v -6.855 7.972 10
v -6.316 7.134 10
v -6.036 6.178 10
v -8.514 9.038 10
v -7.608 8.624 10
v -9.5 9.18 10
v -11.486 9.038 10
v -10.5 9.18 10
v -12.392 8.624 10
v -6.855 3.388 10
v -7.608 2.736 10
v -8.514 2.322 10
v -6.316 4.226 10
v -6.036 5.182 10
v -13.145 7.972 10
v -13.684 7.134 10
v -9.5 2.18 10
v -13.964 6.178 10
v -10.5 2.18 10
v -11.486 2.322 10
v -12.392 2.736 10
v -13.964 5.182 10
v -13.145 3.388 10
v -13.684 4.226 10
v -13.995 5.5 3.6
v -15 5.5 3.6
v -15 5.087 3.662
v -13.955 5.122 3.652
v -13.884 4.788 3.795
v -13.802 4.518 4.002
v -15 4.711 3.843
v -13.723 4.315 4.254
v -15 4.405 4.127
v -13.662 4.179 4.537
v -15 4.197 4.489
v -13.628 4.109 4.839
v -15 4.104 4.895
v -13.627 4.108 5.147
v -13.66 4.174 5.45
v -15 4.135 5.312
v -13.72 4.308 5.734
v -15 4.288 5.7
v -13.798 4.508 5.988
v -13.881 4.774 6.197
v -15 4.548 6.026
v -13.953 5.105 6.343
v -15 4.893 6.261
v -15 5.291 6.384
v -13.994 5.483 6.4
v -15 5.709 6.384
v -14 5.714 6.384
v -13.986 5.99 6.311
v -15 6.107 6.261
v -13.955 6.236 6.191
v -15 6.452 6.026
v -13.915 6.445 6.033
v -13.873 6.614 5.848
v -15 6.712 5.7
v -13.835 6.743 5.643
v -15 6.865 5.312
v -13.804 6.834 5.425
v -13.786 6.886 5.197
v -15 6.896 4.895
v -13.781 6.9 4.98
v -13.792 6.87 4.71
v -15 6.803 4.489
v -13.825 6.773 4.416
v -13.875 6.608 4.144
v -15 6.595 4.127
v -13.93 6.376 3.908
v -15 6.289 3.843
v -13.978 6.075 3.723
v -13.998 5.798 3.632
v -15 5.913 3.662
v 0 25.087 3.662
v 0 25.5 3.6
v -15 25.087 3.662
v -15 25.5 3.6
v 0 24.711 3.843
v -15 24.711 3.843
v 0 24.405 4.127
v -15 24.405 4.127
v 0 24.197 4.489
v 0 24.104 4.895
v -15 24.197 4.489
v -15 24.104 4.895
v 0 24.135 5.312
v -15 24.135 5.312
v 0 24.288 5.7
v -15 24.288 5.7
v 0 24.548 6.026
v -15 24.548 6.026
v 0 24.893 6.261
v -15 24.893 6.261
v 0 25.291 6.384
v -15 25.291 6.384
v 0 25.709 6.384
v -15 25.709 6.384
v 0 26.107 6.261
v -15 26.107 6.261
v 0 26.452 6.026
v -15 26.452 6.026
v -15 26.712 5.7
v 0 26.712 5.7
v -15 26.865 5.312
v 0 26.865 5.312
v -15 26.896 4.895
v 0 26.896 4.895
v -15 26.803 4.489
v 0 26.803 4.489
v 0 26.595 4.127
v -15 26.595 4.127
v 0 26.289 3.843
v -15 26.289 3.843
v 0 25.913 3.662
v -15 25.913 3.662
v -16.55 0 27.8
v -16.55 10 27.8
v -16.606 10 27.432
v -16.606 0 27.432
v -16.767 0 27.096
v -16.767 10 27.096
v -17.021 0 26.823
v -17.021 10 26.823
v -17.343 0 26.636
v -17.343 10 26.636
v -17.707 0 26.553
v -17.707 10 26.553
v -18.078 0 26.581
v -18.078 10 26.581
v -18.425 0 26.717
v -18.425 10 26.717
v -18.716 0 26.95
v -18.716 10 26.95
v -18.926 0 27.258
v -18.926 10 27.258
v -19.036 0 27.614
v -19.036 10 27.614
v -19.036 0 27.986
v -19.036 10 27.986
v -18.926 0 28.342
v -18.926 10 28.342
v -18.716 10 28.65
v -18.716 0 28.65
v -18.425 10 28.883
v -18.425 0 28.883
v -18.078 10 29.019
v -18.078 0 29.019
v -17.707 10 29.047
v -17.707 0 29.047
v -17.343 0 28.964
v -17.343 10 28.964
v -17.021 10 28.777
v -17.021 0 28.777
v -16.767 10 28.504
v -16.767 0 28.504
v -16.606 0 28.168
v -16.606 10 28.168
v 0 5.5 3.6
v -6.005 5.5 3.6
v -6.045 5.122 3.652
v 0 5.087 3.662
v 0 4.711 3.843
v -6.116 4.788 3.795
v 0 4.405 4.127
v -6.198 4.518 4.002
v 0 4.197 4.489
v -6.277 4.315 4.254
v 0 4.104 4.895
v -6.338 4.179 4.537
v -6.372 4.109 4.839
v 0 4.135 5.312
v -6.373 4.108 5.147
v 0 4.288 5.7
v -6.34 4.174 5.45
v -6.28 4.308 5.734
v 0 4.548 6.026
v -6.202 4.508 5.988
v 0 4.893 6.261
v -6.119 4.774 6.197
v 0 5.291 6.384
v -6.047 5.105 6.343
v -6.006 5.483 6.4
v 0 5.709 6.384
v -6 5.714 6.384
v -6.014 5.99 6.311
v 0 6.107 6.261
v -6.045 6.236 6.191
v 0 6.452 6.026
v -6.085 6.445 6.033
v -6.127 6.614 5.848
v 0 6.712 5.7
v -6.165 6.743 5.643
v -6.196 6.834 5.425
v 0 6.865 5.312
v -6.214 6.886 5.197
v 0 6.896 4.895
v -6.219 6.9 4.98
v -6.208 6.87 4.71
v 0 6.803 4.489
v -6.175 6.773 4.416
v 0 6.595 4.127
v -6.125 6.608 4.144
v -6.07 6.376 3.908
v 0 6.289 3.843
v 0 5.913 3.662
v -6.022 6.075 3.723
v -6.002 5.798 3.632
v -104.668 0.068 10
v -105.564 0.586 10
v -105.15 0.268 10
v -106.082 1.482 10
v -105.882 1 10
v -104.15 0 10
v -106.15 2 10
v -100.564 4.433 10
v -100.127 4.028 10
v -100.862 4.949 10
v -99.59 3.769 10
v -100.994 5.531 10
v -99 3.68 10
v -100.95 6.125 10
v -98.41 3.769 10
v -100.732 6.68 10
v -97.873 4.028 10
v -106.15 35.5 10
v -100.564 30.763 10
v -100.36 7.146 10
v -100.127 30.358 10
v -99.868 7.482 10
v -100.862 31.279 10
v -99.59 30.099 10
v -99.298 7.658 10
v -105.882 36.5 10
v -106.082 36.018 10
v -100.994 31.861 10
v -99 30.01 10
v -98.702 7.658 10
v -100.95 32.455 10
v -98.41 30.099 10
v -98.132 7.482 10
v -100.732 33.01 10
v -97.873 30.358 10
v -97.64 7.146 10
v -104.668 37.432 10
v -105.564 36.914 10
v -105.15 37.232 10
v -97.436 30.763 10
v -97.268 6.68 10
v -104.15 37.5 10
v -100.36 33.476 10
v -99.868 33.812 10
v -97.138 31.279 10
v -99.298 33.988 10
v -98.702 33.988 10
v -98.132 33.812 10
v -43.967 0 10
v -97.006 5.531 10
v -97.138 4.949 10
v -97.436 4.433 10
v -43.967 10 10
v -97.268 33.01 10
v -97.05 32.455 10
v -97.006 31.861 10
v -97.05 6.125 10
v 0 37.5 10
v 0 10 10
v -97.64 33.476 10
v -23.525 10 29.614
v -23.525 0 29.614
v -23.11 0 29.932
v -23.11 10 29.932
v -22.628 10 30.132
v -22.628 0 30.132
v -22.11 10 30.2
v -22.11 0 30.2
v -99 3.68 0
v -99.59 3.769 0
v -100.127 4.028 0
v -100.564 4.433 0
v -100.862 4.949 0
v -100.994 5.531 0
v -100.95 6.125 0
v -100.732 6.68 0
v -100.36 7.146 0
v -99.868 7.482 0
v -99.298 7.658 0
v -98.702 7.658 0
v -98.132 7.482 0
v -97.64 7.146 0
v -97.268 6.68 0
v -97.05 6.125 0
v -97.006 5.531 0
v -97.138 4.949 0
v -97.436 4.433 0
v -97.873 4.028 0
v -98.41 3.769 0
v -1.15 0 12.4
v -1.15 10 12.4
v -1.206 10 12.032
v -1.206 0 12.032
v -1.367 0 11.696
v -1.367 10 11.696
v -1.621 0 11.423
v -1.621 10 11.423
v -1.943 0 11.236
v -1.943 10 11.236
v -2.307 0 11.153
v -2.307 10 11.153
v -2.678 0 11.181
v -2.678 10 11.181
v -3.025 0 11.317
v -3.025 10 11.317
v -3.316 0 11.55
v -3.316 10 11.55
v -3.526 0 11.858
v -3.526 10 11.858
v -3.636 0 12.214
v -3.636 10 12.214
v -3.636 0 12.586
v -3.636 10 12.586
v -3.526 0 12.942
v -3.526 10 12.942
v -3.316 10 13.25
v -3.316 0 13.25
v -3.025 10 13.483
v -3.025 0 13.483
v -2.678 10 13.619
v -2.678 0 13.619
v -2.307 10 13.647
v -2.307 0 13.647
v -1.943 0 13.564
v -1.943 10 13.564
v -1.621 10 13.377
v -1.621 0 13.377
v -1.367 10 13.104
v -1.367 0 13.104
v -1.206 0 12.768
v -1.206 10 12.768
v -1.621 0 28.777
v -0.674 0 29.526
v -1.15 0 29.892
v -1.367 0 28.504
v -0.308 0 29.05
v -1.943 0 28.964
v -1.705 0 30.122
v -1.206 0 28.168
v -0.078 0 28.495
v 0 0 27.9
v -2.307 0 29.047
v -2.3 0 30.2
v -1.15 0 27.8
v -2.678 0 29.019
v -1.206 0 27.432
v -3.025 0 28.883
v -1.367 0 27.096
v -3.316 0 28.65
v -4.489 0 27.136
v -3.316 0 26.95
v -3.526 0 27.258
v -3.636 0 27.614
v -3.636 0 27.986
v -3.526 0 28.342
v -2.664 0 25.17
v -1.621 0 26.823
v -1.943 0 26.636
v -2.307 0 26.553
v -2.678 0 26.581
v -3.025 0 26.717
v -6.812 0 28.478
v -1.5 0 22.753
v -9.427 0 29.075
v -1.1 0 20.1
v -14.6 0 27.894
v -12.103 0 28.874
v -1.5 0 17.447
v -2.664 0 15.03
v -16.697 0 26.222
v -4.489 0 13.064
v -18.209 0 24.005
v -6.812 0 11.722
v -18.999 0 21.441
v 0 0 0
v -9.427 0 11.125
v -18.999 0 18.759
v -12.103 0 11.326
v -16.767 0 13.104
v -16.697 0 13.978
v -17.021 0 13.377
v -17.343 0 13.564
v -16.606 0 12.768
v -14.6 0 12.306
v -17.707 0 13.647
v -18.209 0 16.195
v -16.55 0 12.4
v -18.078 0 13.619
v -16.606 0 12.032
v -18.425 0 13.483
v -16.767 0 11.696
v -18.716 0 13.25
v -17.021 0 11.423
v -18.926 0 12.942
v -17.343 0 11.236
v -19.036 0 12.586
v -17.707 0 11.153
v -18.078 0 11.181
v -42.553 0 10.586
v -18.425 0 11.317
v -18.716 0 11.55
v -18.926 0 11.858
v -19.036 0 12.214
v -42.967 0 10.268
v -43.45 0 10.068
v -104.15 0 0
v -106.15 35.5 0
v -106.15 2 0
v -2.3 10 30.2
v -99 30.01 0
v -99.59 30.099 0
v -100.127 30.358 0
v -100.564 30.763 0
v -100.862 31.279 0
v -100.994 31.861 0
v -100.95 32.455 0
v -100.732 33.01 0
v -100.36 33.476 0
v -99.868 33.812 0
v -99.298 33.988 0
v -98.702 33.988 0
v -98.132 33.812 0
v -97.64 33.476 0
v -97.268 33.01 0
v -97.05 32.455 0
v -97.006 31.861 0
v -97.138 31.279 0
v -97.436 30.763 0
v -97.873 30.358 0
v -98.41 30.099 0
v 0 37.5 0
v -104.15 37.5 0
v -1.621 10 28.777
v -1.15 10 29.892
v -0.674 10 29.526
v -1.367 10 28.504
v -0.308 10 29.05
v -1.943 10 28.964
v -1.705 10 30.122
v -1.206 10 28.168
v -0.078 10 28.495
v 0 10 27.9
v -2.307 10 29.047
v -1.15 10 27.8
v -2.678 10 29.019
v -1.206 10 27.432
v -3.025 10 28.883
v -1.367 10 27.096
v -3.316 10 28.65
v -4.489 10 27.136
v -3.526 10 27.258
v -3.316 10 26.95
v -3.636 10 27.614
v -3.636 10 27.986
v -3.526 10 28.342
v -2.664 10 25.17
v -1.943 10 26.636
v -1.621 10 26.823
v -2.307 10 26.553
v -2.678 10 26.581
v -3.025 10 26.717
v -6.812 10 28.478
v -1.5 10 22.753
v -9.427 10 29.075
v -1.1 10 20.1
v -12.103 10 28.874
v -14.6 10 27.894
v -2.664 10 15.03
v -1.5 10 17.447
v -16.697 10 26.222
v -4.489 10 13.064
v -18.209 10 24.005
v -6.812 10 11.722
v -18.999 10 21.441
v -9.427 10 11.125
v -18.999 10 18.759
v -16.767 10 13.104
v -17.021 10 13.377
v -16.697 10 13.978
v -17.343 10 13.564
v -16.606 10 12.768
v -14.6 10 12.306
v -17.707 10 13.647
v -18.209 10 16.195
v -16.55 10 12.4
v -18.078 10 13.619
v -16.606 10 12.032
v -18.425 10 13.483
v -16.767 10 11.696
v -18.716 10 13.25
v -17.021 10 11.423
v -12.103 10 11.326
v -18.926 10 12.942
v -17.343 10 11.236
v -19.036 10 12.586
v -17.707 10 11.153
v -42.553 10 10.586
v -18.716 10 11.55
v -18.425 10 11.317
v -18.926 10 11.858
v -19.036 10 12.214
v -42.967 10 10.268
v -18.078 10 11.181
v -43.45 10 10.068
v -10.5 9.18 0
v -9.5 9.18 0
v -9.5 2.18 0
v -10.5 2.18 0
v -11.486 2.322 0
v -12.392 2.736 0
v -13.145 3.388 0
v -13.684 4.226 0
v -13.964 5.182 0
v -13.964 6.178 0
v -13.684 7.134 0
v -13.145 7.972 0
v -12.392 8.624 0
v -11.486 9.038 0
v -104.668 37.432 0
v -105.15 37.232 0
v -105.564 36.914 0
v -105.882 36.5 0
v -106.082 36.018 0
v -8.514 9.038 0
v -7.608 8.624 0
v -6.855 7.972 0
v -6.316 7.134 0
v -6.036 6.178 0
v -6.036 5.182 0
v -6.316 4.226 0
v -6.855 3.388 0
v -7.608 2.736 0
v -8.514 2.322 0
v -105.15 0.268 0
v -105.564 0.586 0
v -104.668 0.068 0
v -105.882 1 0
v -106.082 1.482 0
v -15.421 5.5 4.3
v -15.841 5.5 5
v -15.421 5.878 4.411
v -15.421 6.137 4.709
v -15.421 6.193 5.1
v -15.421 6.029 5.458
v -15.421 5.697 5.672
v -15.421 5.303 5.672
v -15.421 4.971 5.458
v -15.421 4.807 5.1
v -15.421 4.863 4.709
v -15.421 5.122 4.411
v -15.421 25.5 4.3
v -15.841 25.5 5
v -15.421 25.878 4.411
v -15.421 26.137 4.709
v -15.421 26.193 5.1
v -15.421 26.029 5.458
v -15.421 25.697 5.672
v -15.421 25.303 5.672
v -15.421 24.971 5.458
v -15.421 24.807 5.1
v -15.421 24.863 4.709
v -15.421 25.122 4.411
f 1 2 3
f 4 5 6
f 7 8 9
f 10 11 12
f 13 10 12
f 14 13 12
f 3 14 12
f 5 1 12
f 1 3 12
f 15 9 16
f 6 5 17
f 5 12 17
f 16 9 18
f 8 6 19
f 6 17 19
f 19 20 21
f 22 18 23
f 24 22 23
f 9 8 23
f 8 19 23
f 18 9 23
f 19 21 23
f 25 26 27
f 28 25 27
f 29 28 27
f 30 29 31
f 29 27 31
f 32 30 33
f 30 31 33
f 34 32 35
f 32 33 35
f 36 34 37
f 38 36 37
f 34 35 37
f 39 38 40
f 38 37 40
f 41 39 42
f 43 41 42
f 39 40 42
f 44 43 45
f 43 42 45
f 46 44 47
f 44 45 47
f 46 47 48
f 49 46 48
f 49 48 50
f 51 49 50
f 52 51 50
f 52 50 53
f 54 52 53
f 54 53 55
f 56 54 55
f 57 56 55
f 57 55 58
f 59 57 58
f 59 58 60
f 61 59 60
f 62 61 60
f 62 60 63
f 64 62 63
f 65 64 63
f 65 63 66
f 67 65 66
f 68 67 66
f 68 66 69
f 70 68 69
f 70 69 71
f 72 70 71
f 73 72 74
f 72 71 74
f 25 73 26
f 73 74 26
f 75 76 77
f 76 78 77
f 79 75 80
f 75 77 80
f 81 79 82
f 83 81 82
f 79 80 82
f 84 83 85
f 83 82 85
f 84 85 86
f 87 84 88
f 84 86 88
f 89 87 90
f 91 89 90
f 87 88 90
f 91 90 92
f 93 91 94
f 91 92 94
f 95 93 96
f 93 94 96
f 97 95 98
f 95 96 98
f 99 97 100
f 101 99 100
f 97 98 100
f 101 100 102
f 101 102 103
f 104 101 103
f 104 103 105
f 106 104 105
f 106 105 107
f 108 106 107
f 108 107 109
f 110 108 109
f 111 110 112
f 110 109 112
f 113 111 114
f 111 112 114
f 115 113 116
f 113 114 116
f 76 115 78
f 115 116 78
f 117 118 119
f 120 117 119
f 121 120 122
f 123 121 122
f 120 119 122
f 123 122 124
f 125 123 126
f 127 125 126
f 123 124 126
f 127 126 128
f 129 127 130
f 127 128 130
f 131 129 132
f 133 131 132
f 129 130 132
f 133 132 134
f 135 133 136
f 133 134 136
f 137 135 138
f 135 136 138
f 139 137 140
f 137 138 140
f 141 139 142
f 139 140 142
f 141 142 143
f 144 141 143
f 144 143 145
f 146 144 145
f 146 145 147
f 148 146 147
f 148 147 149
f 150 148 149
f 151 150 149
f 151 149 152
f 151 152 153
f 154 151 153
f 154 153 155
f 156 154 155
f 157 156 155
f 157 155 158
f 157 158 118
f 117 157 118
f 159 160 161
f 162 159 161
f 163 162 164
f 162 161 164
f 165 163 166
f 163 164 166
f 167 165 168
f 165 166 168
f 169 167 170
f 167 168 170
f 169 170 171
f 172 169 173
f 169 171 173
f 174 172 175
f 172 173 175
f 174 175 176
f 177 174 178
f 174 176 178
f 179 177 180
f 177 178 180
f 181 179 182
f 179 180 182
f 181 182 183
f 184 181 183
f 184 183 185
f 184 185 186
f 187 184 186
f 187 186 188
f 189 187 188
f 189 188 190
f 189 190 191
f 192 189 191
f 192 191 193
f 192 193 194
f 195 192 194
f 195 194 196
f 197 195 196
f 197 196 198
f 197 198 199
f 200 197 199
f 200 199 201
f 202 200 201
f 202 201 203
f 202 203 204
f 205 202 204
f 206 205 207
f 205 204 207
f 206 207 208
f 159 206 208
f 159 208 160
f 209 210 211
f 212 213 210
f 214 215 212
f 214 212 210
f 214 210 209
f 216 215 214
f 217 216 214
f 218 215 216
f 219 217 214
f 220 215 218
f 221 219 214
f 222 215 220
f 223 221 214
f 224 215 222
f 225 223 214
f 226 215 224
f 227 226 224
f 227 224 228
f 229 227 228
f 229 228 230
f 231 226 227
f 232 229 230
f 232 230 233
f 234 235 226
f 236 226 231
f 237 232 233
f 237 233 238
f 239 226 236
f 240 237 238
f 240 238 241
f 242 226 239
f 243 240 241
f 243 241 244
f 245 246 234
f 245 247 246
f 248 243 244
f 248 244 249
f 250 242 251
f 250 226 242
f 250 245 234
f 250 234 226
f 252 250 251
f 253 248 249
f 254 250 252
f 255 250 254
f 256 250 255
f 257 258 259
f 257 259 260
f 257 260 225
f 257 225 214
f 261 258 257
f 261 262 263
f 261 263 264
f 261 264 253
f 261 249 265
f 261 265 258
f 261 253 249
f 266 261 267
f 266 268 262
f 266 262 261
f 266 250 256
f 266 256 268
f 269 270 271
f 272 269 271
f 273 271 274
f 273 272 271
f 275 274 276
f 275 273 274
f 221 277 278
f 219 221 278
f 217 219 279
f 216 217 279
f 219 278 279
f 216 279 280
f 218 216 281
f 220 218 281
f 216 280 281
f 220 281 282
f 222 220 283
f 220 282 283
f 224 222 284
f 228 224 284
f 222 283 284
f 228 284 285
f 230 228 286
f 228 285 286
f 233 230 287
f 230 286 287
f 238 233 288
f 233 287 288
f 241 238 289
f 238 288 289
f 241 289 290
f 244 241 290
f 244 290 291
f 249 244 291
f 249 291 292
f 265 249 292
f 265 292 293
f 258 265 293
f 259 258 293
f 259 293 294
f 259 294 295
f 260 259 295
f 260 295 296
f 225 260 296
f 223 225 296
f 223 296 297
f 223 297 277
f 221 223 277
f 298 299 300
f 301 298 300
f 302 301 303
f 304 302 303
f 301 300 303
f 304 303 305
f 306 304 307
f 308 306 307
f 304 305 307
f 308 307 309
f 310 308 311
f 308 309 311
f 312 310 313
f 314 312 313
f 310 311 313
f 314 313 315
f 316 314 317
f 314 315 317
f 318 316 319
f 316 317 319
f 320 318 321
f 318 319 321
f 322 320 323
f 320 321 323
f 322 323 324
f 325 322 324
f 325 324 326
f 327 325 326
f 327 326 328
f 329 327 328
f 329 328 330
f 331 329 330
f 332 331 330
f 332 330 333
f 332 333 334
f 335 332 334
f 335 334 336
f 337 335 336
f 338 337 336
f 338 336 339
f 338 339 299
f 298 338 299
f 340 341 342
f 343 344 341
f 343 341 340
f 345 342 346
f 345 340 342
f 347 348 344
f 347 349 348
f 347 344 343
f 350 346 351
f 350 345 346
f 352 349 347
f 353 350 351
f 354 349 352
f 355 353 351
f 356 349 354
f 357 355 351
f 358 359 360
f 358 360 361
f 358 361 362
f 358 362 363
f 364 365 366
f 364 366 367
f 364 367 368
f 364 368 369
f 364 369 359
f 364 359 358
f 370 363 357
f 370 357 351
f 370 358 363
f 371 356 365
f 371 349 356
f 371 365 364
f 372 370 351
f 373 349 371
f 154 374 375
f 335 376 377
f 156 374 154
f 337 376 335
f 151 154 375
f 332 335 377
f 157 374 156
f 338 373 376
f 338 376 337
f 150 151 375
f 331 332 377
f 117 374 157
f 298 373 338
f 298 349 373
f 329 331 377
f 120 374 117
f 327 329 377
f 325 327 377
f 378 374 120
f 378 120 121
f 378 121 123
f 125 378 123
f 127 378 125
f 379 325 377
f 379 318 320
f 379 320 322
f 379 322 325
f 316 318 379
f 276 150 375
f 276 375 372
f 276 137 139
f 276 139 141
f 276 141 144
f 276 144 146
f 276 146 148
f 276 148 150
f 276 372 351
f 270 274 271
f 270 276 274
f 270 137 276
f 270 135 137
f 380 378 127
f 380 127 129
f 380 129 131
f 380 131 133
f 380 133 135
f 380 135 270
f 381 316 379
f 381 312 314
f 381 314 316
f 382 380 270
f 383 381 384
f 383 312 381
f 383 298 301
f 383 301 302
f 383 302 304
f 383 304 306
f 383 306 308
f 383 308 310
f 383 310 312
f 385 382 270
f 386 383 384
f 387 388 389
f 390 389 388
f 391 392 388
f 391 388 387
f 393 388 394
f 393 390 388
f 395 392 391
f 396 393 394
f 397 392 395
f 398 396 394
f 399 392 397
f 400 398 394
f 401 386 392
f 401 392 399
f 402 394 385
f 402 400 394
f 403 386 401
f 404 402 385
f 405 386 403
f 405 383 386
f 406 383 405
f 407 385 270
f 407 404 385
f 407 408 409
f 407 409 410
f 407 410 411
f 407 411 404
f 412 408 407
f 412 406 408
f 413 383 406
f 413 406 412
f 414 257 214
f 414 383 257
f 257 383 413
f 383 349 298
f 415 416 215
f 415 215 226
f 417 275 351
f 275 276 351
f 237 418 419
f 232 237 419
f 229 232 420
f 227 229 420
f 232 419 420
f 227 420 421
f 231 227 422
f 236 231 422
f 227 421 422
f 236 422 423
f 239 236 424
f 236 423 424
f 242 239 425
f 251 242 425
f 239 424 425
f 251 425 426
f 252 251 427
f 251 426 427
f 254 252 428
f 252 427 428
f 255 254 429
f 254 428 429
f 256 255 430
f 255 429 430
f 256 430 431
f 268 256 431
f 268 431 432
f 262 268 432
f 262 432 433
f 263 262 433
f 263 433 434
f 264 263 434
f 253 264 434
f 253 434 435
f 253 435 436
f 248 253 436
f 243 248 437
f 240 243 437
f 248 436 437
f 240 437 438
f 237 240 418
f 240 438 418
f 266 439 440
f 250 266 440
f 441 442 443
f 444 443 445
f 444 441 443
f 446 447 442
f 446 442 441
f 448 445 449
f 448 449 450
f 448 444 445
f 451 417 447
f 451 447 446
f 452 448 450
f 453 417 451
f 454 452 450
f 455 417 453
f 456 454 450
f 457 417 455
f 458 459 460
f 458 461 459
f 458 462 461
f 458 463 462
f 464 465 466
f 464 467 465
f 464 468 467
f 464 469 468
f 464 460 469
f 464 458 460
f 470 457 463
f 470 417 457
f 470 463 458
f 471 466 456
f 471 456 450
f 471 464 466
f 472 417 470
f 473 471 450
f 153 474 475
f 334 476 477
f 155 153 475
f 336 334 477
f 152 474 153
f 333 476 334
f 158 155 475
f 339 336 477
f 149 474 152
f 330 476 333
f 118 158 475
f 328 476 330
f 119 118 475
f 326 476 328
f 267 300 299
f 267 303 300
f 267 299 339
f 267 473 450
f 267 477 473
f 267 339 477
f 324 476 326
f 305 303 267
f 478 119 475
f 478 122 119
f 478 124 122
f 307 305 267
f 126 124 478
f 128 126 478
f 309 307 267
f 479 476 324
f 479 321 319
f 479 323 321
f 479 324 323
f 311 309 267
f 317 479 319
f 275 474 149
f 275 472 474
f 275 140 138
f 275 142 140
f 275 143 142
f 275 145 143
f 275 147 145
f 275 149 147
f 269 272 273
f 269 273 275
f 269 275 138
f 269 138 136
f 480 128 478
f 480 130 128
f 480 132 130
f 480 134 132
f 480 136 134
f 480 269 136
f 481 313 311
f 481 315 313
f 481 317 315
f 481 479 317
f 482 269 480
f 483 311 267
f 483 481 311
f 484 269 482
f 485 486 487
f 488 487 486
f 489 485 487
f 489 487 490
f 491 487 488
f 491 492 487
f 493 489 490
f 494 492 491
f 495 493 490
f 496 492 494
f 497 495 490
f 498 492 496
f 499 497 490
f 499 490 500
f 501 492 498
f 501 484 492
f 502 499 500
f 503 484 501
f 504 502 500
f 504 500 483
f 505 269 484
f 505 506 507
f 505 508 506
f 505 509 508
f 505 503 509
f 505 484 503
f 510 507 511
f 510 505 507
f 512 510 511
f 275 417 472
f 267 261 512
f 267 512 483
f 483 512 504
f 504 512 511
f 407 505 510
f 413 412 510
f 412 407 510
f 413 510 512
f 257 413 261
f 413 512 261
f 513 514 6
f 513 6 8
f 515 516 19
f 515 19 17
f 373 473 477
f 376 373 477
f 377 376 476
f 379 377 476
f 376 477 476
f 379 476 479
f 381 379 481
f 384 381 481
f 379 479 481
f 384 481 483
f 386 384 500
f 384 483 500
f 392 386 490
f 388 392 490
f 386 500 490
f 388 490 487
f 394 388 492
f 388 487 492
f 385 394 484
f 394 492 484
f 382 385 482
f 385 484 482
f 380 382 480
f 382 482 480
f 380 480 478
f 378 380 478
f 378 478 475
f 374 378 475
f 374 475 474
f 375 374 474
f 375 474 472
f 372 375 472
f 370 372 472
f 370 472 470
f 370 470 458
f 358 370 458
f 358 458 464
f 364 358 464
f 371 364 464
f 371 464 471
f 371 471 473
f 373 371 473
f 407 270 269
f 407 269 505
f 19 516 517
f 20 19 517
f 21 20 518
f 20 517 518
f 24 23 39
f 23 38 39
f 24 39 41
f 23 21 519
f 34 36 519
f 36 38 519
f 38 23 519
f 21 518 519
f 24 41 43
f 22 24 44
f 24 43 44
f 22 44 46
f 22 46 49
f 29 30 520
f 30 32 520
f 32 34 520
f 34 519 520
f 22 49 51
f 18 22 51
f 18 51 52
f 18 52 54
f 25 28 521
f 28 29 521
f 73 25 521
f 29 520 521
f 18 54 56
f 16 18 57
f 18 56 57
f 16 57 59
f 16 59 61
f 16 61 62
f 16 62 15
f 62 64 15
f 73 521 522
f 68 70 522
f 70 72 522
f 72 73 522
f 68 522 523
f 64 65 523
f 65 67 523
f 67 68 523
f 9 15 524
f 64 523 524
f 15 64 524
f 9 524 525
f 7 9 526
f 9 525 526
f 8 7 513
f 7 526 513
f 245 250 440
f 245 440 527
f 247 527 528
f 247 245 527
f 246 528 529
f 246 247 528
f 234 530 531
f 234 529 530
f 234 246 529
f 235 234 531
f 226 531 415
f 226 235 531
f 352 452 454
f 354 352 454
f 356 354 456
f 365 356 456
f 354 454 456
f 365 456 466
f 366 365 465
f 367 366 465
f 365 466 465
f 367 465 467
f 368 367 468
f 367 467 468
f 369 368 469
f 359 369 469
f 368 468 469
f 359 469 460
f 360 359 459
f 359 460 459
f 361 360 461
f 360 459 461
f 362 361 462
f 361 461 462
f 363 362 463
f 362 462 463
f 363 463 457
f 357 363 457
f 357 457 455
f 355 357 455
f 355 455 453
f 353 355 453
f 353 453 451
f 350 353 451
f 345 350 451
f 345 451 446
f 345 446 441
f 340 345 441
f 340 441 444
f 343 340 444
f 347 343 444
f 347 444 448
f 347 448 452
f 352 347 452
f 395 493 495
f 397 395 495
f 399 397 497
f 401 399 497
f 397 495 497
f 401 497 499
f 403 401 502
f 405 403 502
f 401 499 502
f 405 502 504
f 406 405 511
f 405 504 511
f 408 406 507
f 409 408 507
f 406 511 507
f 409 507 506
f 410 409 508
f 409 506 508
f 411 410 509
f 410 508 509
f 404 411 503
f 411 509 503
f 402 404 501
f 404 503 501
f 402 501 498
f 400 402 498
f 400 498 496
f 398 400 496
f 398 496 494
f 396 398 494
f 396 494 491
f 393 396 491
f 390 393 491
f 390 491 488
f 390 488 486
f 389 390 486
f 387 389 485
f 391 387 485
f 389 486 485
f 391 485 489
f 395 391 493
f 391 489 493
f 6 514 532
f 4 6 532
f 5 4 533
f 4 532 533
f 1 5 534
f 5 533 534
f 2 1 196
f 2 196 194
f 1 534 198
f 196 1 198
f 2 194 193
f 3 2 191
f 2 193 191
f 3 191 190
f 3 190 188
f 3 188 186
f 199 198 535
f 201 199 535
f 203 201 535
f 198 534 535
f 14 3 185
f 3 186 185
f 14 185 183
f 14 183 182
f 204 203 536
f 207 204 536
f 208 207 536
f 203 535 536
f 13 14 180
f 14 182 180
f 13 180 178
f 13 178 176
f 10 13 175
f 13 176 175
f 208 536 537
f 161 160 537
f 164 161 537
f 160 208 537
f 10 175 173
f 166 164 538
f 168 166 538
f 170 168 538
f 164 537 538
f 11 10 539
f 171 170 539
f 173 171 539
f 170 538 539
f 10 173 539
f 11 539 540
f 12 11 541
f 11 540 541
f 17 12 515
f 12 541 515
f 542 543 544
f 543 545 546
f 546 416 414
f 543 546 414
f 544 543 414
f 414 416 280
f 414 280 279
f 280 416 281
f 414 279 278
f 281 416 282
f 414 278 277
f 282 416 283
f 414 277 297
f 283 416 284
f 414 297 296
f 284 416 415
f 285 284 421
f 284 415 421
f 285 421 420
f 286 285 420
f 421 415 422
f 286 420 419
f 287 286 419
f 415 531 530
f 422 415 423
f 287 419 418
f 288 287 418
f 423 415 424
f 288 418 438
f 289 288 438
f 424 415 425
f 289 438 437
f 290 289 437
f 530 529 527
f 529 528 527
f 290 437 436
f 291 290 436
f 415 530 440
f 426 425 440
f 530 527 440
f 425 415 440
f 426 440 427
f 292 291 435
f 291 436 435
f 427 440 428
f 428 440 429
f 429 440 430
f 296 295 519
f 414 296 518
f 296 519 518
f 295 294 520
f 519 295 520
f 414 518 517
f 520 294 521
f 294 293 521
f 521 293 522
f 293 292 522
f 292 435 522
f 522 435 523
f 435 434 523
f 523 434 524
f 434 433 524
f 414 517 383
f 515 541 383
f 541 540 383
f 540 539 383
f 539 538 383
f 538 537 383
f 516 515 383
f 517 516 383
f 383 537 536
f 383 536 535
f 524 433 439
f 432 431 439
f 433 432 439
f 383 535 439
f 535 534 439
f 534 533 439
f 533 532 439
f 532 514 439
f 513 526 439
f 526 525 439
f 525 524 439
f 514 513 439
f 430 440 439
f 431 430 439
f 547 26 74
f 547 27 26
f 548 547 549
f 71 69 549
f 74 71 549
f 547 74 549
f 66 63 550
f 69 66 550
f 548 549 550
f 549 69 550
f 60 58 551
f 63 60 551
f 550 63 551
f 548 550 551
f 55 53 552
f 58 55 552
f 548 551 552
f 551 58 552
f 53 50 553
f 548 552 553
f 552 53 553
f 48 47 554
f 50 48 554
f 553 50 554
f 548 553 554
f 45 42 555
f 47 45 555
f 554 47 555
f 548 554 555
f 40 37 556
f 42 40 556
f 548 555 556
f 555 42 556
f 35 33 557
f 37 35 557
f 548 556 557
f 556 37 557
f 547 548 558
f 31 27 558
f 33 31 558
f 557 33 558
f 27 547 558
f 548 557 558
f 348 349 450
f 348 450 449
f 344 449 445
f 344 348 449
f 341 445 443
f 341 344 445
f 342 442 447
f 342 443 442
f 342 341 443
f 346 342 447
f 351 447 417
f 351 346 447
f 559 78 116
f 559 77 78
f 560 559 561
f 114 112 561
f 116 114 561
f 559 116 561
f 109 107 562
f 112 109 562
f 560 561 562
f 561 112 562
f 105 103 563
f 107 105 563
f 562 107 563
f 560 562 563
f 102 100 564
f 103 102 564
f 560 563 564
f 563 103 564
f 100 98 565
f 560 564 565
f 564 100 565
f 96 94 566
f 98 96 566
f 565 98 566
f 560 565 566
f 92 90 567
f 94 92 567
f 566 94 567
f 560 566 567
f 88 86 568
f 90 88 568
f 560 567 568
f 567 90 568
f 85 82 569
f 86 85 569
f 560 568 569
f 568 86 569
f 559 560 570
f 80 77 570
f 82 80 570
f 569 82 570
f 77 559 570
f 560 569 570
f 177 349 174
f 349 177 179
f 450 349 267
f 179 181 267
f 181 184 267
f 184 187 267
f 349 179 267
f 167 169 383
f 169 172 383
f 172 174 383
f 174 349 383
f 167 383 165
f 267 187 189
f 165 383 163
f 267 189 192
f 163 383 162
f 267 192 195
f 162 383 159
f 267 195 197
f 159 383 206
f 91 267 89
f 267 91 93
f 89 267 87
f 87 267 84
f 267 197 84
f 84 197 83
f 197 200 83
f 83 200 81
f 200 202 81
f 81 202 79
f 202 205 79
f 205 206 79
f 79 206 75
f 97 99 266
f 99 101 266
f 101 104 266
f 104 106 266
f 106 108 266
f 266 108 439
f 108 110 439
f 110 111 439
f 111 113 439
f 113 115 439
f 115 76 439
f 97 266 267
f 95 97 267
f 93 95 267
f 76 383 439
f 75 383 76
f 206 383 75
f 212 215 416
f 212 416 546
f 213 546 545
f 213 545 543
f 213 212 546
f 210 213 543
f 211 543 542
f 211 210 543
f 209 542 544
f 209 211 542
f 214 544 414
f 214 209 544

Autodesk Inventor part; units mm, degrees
ref_plane "YZ Plane" through (0, 0, 0) normal (1, 0, 0) x (0, 1, 0)
ref_plane "XZ Plane" through (0, 0, 0) normal (0, 1, 0) x (-1, 0, 0)
ref_plane "XY Plane" through (0, 0, 0) normal (0, 0, 1) x (1, 0, 0)
ref_plane "Arbeitsebene1" through (0, 0, 0) normal (0, 0, 1) x (1, 0, 0)
sketch "Skizze1" plane through (0, 0, 0) normal (0, 0, 1) x (1, 0, 0)
  line L0 (-106.15, 0) -> (-106.15, 8) projected
  line L1 (0, 0) -> (-106.15, 0) projected
  line L2 (0, 0) -> (0, 37.5) projected
  line L3 (0, 37.5) -> (-176.65, 37.5) projected
  line L4 (-176.65, 0) -> (-176.65, 37.5) projected
  line L5 (-137.15, 0) -> (-176.65, 0) projected
  line L6 (-137.15, 8) -> (-137.15, 0) projected
  arc A0 (-135.15, 10) -> (-137.15, 8) centre (-135.15, 8) ccw projected
  line L7 (-108.15, 10) -> (-135.15, 10) projected
  arc A1 (-106.15, 8) -> (-108.15, 10) centre (-108.15, 8) ccw projected
  circle A2 centre (-99, 32.01) radius 1.9 construction
  arc A3 (-9.5, 2.18) -> (-9.5, 9.18) centre (-9.5, 5.68) ccw projected
  line L8 (-10.5, 2.18) -> (-9.5, 2.18) projected
  arc A4 (-10.5, 9.18) -> (-10.5, 2.18) centre (-10.5, 5.68) ccw projected
  line L9 (-9.5, 9.18) -> (-10.5, 9.18) projected
  circle A5 centre (-99, 5.68) radius 1.525 construction
  circle A6 centre (-99, 32.01) radius 1.4
  circle A7 centre (-99, 5.68) radius 1.4
  line L10 (-20.2, 0) -> (-20.2, -25.9) projected
  line L11 (0, 0) -> (0, -25.9) projected
  line L12 (-106.15, 37.5) -> (0, 37.5)
  line L13 (0, 37.5) -> (0, 0)
  line L14 (0, 0) -> (-106.15, 0)
  line L15 (-106.15, 0) -> (-106.15, 37.5)
  dimension "d0" = 2.8
  dimension "d1" = 2.8
extrude "Extrusion1" add sketch "Skizze1" along normal blind 10 contours L0 L15 L3 L2 L1
ref_plane "Arbeitsebene2" through (0, 0, 25.2) normal (0, 1, 0) x (0, 0, -1)
sketch "Skizze2" plane through (0, 0, 25.2) normal (0, 1, 0) x (0, 0, -1)
  line L0 (-5, 17.9) -> (-5, 2.3) projected
  arc A0 (-5, 2.3) -> (-2.7, 0) centre (-2.7, 2.3) ccw projected
  line L1 (-2.7, 0) -> (12.9, 0) projected
  arc A1 (12.9, 0) -> (15.2, 2.3) centre (12.9, 2.3) ccw projected
  line L2 (15.2, 2.3) -> (15.2, 17.9) projected
  arc A2 (15.2, 17.9) -> (12.9, 20.2) centre (12.9, 17.9) ccw projected
  line L3 (12.9, 20.2) -> (-2.7, 20.2) projected
  arc A3 (-2.7, 20.2) -> (-5, 17.9) centre (-2.7, 17.9) ccw projected
  circle A4 centre (5.1, 10.1) radius 8 projected
  circle A5 centre (-2.6, 2.4) radius 1 projected
  circle A6 centre (12.8, 2.4) radius 1 projected
  circle A7 centre (12.8, 17.8) radius 1 projected
  circle A8 centre (-2.6, 17.8) radius 1 projected
  line L4 (-5, 17.9) -> (-5, 22.9389)
  line L5 (-5, 22.9389) -> (15.2, 43.1389)
  line L6 (15.2, 106.15) -> (15.2, 0) projected
  line L7 (15.2, 0) -> (15.2, 2.3)
  line L8 (15.2, 0) -> (-5, 0)
  line L9 (-5, 0) -> (-5, 20.2)
  line L10 (-5, 20.2) -> (15.2, 20.2)
  line L11 (15.2, 20.2) -> (15.2, 0)
  point P0 (25.2, 0)
  point P1 (15.2, 20.2)
  point P2 (15.2, 17.9)
  point P3 (12.9, 0)
  point P4 (15.2, 2.3)
  dimension "d13" = 135
extrude "Extrusion2" add sketch "Skizze2" along normal blind 10 contours A3 L3 A2 L2 A1 L1 A0 L0 | L4 L10 A3 | L10 L4 L5 L6 L3 | L10 L6 A2 | A1 L6 L8
sketch "Skizze3" plane through (-106.15, 37.5, 0) normal (0, 1, 0) x (1, 0, 0)
  circle A0 centre (96.05, -20.1) radius 8 projected
  circle A1 centre (88.35, -27.8) radius 1 projected
  circle A2 centre (88.35, -12.4) radius 1 projected
  circle A3 centre (103.75, -27.8) radius 1 projected
  circle A4 centre (103.75, -12.4) radius 1 projected
  circle A5 centre (96.05, -20.1) radius 9
  circle A6 centre (88.35, -27.8) radius 1.25
  circle A7 centre (103.75, -27.8) radius 1.25
  circle A8 centre (103.75, -12.4) radius 1.25
  circle A9 centre (88.35, -12.4) radius 1.25
  point P0 (106.15, 0)
  point P1 (102.2136, -10)
  point P2 (89.8864, -10)
  dimension "d6" = 18
  dimension "d7" = 2.5
  dimension "d8" = 2.5
  dimension "d9" = 2.5
  dimension "d10" = 2.5
extrude "Extrusion3" cut sketch "Skizze3" against normal through all contours A0 | A1 | A2 | A3 | A4 | A5 | A6 | A7 | A8 | A9
fillet "Rundung1" radius 2 4 edges at (-22.9389, 5, 30.2) (-43.1389, 5, 10) (-106.15, 37.5, 5) (-106.15, 0, 5)
sketch "Skizze4" plane through (0, 0, 0) normal (1, 0, 0) x (0, 0, -1)
  circle A0 centre (-5, 25.5) radius 1.75 projected
  circle A1 centre (-5, 5.5) radius 1.75 projected
  point P0 (0, 0)
hole "Bohrung1" at (0, 25.5, 5) at (0, 5.5, 5) direction (-1, 0, 0) diameter 2.8 depth 15 tip angle 118
sketch "Skizze5" plane through (0, 0, 10) normal (0, 0, 1) x (1, 0, 0)
  arc A0 (-106.15, 2) -> (-104.15, 0) centre (-104.15, 2) ccw projected
  line L0 (-104.15, 0) -> (-43.9674, 0) projected
  line L1 (-43.9674, 10) -> (-43.9674, 0) projected
  line L2 (-43.9674, 10) -> (0, 10) projected
  line L3 (0, 10) -> (0, 37.5) projected
  line L4 (0, 37.5) -> (-104.15, 37.5) projected
  arc A1 (-104.15, 37.5) -> (-106.15, 35.5) centre (-104.15, 35.5) ccw projected
  line L5 (-106.15, 35.5) -> (-106.15, 2) projected
  circle A2 centre (-99, 32.01) radius 1.4 projected
  circle A3 centre (-99, 5.68) radius 1.4 projected
  point P0 (0, 0)
hole "Bohrung2" at (-99, 5.68, 10) at (-99, 32.01, 10) direction (0, 0, -1) diameter 4 depth 15 tip angle 118
properties part number "OT2-Gripper_base"
